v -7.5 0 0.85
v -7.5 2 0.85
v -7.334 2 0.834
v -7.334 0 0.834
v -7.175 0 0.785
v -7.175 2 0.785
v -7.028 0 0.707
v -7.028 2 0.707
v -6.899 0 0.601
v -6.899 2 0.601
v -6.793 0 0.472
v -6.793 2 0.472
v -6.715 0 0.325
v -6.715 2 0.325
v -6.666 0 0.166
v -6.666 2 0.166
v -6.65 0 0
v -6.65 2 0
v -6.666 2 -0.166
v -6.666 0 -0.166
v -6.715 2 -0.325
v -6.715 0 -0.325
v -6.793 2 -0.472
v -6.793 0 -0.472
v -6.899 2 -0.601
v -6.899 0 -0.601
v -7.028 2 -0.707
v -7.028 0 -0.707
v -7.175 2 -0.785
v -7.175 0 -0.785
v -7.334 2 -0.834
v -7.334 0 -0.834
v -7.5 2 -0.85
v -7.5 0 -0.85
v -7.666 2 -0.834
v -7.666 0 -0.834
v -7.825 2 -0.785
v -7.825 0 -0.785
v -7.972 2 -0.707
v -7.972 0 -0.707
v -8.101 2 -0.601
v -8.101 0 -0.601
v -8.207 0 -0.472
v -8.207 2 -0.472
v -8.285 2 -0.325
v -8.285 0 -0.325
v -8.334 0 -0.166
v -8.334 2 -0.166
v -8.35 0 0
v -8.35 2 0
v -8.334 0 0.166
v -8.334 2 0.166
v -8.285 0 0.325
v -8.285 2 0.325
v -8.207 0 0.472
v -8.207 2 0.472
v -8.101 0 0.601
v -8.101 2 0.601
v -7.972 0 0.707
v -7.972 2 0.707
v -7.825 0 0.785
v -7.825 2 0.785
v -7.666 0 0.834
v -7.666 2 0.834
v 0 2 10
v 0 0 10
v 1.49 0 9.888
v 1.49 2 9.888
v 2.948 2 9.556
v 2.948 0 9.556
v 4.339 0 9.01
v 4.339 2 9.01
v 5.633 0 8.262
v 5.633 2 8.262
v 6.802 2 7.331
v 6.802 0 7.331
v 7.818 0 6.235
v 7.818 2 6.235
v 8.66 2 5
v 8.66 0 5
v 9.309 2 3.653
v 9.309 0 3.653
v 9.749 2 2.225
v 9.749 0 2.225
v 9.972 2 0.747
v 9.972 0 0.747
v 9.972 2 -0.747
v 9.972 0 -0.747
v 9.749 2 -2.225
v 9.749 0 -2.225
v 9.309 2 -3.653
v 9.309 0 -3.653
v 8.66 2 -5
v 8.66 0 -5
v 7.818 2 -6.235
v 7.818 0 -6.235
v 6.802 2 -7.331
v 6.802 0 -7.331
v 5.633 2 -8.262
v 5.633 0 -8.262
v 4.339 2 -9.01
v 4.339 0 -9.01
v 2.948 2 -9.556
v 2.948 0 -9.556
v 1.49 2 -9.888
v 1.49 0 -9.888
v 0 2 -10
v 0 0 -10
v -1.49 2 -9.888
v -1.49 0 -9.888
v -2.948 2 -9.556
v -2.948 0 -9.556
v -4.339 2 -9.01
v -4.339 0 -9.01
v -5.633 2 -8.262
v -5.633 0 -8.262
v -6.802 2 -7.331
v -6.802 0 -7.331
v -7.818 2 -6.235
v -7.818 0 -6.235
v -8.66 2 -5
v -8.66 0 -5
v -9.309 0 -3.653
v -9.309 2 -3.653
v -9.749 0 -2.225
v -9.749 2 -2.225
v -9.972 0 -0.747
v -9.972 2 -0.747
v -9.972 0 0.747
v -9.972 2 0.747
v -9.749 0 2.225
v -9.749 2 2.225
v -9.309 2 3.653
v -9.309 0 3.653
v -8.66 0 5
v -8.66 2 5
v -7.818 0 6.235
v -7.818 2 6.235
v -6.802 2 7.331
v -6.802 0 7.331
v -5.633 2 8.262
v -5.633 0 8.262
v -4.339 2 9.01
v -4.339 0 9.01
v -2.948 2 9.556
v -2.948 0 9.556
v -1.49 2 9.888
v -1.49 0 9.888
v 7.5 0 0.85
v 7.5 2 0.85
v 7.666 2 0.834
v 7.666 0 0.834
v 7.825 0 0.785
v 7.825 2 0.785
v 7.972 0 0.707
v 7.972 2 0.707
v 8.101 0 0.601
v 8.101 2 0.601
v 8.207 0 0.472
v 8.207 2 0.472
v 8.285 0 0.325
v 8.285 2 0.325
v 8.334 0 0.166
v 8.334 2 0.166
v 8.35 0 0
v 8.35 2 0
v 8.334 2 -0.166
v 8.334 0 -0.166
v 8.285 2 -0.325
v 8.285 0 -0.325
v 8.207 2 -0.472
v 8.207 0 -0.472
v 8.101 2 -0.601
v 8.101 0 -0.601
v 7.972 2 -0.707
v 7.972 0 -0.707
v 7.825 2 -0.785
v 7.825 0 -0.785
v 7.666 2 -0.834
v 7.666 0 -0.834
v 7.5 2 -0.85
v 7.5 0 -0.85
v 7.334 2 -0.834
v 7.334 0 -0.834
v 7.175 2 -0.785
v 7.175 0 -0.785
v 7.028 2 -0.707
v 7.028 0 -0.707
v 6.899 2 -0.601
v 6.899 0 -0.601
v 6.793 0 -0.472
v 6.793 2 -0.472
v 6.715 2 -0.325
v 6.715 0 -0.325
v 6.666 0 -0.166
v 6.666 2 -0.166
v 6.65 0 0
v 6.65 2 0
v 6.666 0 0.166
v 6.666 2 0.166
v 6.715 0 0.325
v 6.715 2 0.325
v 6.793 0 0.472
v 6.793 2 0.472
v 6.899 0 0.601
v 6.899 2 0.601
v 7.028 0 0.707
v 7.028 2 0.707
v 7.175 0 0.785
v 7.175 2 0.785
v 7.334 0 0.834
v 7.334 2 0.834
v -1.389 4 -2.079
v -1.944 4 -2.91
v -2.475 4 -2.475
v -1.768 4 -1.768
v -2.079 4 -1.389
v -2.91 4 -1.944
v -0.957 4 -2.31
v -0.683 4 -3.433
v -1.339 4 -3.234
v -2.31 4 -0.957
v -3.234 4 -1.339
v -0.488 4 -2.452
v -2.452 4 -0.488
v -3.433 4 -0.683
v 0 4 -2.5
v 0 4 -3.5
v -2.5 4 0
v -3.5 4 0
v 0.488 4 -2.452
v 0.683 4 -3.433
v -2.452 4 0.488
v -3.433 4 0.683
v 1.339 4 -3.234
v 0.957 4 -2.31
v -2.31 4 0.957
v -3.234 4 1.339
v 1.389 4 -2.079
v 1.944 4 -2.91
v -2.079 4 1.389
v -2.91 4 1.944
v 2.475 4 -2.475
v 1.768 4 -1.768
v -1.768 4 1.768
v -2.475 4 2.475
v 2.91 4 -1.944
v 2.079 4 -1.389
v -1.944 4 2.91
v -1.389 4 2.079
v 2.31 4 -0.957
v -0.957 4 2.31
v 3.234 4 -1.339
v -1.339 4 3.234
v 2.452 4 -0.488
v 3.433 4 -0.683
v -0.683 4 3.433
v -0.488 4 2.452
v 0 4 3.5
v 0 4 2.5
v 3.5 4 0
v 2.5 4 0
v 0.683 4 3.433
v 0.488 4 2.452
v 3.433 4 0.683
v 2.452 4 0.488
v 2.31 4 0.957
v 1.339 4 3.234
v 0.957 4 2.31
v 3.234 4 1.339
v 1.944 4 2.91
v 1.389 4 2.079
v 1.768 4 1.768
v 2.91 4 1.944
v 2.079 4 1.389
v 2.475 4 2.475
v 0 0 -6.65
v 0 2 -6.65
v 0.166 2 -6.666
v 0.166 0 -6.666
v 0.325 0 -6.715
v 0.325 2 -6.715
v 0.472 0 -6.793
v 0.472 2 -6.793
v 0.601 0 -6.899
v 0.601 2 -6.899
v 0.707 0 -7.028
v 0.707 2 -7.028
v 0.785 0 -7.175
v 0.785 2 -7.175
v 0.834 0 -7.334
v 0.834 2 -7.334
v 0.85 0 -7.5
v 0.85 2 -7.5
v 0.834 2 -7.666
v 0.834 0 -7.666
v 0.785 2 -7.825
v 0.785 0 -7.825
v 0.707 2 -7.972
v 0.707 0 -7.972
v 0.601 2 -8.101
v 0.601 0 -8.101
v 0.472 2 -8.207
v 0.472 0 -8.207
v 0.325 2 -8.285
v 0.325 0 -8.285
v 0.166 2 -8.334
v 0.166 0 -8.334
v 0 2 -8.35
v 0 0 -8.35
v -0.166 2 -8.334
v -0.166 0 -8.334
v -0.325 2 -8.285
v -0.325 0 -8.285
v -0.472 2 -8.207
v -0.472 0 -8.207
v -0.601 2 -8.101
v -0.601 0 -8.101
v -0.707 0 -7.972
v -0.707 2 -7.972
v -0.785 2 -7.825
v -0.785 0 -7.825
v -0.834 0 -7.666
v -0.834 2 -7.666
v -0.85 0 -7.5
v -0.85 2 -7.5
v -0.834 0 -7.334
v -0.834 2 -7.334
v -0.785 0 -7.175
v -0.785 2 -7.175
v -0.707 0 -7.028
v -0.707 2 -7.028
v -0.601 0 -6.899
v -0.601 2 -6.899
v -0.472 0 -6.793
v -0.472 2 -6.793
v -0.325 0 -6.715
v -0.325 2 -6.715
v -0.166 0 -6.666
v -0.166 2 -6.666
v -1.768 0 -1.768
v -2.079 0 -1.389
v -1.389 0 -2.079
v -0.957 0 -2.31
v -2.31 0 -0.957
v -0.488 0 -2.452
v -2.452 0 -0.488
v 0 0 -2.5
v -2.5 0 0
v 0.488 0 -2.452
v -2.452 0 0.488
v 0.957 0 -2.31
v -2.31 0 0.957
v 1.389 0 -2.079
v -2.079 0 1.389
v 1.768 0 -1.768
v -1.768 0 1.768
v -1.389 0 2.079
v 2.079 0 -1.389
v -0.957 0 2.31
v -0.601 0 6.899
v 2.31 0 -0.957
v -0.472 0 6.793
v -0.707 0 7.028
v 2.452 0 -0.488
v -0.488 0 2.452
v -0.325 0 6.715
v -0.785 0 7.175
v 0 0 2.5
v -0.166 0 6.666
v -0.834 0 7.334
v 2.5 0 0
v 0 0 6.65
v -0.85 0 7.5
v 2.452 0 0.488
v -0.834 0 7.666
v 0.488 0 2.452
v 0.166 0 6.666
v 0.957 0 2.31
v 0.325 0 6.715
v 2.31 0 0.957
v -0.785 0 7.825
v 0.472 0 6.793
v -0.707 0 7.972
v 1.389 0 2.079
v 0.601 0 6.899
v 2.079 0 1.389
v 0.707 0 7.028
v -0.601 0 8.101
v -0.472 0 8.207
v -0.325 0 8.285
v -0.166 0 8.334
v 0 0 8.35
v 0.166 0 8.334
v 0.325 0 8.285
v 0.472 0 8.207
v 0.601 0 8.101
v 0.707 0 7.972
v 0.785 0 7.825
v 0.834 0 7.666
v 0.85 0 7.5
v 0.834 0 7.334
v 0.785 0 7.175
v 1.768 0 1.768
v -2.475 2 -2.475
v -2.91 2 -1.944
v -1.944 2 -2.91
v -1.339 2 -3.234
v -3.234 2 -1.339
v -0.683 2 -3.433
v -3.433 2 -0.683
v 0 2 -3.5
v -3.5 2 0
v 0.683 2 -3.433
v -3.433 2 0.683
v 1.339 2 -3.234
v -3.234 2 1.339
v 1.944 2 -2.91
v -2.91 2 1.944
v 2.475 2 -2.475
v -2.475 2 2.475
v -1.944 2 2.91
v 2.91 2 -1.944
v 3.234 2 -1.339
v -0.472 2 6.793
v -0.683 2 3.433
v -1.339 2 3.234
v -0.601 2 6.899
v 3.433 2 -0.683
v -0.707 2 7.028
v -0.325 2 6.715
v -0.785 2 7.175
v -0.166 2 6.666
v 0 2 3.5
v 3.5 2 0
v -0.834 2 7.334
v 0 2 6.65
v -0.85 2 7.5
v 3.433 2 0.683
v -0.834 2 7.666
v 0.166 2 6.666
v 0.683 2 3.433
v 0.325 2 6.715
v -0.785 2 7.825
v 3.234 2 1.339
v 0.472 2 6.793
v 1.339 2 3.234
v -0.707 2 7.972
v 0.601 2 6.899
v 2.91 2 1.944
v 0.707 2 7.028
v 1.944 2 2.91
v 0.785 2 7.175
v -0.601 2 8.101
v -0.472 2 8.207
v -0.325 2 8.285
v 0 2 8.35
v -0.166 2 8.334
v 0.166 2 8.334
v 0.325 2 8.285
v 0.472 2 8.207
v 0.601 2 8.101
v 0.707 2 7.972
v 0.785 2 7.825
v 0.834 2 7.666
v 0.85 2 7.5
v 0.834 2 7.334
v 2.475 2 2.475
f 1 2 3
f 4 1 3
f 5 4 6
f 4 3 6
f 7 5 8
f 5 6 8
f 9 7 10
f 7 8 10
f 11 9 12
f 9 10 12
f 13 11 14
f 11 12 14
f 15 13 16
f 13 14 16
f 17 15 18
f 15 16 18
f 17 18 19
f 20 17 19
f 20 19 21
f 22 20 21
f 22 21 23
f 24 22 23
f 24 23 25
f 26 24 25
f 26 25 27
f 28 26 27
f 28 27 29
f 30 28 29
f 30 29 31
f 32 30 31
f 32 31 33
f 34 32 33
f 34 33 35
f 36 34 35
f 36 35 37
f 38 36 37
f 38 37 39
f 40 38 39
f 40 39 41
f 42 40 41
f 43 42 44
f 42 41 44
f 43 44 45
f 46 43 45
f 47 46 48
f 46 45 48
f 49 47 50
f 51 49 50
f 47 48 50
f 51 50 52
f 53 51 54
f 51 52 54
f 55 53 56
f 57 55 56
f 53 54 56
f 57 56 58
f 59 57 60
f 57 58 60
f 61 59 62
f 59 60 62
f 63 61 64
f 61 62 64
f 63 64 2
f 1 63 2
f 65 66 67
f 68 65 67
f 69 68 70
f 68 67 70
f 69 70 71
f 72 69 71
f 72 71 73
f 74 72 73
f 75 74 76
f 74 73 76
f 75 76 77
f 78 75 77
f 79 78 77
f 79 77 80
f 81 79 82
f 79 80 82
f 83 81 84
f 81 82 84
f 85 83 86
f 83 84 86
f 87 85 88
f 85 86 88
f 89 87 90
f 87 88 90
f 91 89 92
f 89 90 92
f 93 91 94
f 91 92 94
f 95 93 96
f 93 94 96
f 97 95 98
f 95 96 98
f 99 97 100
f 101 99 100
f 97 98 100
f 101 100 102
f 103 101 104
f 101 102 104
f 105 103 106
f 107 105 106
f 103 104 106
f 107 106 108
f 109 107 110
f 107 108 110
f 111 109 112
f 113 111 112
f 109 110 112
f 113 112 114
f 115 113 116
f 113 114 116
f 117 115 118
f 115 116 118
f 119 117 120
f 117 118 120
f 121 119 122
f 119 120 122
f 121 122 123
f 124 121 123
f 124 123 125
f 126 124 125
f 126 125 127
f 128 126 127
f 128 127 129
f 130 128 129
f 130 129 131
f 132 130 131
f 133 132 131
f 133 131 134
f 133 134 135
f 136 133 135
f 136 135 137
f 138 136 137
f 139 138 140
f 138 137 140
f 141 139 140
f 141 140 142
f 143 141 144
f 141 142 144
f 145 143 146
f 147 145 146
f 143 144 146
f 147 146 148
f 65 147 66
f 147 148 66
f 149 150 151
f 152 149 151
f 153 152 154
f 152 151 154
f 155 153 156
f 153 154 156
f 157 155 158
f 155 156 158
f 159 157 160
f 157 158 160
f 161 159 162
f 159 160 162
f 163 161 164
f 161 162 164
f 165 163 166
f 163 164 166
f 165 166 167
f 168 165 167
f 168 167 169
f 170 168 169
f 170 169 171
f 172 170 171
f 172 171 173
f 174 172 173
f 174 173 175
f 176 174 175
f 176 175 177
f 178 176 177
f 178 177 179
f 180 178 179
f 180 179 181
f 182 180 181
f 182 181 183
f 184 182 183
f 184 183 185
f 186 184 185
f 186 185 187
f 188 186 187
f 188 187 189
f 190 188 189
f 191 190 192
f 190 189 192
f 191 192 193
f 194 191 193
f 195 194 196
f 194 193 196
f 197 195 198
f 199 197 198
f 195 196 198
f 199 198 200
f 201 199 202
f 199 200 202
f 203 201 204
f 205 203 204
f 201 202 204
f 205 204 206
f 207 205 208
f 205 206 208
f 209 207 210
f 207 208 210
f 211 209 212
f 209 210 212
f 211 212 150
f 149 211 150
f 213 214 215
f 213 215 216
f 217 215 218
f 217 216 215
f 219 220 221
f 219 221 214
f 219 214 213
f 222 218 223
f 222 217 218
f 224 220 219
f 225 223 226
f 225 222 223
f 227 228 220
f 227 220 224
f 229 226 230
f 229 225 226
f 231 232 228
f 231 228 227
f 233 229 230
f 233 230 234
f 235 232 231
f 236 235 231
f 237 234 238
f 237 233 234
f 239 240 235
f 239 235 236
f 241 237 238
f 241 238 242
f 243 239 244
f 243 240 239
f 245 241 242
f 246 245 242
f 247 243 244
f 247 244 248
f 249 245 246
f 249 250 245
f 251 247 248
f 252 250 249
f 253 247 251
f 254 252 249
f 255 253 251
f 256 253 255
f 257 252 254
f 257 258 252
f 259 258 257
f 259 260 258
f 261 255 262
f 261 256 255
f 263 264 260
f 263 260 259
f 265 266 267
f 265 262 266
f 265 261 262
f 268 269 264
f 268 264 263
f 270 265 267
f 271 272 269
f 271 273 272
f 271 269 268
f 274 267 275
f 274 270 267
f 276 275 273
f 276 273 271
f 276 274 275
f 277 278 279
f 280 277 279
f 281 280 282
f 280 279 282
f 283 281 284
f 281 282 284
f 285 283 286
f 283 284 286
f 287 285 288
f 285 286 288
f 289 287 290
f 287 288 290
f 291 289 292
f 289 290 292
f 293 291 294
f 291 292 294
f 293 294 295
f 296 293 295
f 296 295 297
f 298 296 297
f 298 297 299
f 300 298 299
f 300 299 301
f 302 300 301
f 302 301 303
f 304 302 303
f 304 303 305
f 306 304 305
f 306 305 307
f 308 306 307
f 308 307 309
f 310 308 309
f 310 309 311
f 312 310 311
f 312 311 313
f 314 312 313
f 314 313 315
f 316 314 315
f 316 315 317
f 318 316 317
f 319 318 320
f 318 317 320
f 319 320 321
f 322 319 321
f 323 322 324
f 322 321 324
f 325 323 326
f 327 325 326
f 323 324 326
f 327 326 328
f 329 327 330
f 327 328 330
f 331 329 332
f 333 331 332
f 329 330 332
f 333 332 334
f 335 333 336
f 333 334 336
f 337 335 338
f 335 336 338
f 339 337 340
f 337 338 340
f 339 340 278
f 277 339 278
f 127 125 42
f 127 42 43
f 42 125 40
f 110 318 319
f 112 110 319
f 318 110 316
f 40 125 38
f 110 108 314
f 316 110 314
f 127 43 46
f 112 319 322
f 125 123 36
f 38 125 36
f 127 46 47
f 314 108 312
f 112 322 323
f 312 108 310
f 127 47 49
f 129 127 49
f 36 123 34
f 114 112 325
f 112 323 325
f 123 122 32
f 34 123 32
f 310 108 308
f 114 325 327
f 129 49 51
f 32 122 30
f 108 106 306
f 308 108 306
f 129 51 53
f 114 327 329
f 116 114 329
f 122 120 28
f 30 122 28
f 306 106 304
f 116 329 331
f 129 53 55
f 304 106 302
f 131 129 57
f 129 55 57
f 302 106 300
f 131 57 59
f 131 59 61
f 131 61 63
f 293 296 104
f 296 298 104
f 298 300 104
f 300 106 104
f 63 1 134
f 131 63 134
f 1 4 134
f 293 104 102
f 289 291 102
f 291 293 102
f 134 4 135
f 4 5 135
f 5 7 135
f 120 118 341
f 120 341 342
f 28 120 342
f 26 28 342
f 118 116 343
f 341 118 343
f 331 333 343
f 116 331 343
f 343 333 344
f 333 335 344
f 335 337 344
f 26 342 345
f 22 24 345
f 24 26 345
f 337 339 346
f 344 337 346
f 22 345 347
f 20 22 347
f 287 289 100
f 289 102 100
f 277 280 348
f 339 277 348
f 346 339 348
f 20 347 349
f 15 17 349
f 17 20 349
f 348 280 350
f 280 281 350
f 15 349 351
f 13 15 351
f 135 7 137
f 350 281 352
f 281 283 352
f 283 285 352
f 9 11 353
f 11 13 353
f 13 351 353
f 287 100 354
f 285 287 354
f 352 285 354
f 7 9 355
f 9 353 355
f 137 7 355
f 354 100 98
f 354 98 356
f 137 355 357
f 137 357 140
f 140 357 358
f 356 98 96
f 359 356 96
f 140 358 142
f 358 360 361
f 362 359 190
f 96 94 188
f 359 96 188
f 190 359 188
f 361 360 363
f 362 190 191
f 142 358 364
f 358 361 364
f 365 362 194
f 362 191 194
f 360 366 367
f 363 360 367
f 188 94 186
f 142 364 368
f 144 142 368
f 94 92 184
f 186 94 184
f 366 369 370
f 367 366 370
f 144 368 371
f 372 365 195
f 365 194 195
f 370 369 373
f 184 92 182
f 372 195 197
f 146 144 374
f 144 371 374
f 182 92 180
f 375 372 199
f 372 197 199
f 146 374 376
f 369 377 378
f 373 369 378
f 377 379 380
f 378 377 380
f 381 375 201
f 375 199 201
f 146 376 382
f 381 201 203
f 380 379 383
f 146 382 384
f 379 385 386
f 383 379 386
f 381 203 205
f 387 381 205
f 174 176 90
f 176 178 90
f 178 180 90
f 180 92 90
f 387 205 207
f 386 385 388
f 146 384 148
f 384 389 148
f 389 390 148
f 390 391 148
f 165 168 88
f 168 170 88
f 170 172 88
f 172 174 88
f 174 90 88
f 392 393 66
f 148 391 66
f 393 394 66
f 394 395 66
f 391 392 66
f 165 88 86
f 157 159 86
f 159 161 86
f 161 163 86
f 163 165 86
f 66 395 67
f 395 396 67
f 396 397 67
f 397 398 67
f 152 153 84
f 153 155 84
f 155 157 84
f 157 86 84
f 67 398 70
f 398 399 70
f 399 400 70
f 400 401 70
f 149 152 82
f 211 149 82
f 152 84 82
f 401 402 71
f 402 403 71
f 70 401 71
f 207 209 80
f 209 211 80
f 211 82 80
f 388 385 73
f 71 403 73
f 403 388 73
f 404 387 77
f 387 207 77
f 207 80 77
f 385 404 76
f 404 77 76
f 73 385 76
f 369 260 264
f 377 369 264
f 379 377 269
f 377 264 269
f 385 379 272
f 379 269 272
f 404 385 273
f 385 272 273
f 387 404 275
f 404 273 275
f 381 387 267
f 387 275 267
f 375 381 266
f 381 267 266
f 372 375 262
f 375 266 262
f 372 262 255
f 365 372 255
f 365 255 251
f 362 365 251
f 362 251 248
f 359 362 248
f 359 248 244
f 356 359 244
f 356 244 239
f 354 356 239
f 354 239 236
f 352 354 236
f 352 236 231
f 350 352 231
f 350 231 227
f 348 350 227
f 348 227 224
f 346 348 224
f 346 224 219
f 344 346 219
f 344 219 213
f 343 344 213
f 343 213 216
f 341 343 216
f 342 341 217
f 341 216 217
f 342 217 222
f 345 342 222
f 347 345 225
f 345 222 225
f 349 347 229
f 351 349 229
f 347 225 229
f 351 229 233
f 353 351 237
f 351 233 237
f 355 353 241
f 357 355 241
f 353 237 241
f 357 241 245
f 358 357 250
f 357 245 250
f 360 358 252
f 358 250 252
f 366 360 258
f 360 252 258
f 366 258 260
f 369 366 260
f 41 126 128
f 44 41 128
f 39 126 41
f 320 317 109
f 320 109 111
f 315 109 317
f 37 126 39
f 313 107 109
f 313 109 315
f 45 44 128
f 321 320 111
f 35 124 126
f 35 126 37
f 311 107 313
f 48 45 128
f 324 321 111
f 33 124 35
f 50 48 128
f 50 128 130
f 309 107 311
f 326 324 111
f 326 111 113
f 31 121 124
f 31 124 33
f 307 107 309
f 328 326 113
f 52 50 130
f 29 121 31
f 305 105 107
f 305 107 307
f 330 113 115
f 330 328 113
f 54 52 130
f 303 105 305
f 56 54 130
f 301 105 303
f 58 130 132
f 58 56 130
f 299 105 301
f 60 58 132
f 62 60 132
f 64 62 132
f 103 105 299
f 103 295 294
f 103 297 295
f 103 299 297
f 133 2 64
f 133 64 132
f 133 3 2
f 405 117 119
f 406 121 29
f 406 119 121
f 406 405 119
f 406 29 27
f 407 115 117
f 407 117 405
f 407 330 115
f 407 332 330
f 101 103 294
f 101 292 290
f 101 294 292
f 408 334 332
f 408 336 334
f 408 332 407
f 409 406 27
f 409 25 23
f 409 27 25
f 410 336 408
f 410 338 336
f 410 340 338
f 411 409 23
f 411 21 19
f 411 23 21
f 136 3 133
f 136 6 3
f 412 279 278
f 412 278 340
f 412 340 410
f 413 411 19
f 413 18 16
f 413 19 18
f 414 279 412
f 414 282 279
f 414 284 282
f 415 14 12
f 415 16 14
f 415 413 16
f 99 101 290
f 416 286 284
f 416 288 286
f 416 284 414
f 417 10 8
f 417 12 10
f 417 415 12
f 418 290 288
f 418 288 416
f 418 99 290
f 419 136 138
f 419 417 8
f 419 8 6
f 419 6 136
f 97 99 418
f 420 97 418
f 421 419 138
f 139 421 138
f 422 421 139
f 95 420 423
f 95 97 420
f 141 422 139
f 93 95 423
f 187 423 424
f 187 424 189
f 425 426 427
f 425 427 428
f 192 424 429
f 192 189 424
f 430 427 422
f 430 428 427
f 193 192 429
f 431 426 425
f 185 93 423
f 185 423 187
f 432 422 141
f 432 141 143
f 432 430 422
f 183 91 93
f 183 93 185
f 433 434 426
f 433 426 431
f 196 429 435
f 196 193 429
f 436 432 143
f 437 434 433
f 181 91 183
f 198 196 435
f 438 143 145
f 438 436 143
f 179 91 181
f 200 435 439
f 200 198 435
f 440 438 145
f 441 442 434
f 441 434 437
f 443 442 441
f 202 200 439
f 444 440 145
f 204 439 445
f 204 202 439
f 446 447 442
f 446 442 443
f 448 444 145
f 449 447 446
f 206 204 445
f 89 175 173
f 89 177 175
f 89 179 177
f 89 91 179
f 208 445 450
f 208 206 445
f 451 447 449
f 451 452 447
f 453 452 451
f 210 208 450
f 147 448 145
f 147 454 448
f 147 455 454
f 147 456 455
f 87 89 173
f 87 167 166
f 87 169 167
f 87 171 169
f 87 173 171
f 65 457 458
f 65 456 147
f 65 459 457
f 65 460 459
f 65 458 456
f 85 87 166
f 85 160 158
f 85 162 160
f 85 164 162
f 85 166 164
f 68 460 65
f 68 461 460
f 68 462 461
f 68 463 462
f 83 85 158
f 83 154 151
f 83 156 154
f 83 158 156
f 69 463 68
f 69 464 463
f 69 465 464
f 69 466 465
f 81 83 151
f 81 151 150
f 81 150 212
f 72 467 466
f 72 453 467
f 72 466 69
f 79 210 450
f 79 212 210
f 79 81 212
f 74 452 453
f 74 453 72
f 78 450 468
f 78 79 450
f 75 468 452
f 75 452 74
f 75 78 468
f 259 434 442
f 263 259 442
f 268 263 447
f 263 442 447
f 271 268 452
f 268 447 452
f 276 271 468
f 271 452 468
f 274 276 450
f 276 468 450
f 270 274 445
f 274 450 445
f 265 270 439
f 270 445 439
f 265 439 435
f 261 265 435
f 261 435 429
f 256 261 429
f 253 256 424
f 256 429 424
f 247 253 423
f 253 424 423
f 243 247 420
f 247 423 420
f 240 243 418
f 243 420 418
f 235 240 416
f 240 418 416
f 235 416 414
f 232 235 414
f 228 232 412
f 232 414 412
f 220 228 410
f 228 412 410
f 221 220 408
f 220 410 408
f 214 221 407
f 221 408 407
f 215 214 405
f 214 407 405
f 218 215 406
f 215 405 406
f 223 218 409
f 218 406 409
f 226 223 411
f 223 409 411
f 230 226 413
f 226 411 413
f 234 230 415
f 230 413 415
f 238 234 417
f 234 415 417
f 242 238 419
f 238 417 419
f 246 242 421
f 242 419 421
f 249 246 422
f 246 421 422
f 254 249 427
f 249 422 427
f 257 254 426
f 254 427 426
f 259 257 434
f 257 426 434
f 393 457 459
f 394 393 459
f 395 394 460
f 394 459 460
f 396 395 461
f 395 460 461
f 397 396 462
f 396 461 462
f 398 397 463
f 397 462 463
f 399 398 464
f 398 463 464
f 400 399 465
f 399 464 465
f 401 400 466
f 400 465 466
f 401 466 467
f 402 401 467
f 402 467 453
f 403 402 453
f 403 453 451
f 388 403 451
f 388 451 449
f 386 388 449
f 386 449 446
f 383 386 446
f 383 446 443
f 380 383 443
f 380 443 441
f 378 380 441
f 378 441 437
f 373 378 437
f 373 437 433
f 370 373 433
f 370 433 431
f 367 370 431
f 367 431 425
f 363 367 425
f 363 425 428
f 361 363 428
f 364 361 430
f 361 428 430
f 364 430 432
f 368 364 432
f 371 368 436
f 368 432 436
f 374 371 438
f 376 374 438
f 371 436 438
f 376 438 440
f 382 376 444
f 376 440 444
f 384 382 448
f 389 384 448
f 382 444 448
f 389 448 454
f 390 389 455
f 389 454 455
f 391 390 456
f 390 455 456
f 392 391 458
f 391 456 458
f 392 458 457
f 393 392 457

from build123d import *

# Parameters (mm, degrees)
SKETCH1_R           = 10
BOSS_EXTRUDE1_DEPTH = 2
SKETCH2_R           = 3.5
BOSS_EXTRUDE2_DEPTH = 2
SKETCH3_R           = 2.5
CUT_EXTRUDE1_DEPTH  = 15.696938457
SKETCH4_R           = 0.85
CUT_EXTRUDE2_DEPTH  = 15.282856857


with BuildPart() as part:
    # Sketch1 → Boss-Extrude1 (new body)
    with BuildSketch(Plane(origin=(0, 0, 0), x_dir=(1, 0, 0), z_dir=(0, 1, 0))):
        with Locations(Location((0, 0, 0), (0, 0, 270))):
            Circle(SKETCH1_R)
    extrude(amount=BOSS_EXTRUDE1_DEPTH)

    # Sketch2 → Boss-Extrude2 (add)
    with BuildSketch(Plane(origin=(0, 2, 0), x_dir=(1, 0, 0), z_dir=(0, 1, 0))):
        with Locations(Location((0, 0, 0), (0, 0, 270))):
            Circle(SKETCH2_R)
    extrude(amount=BOSS_EXTRUDE2_DEPTH)

    # Sketch3 → Cut-Extrude1 (cut, through all)
    with BuildSketch(Plane(origin=(0, 4, 0), x_dir=(1, 0, 0), z_dir=(0, 1, 0))):
        with Locations(Location((0, 0, 0), (0, 0, 270))):
            Circle(SKETCH3_R)
    extrude(amount=-CUT_EXTRUDE1_DEPTH, mode=Mode.SUBTRACT)

    # Sketch4 → Cut-Extrude2 (cut, through all)
    with BuildSketch(Plane(origin=(0, 2, 0), x_dir=(1, 0, 0), z_dir=(0, 1, 0))):
        with Locations(Location((0, 7.5, 0), (0, 0, 270))):
            Circle(SKETCH4_R)
        with Locations(Location((-7.5, 0, 0), (0, 0, 270))):
            Circle(SKETCH4_R)
        with Locations(Location((7.5, 0, 0), (0, 0, 270))):
            Circle(SKETCH4_R)
        with Locations(Location((0, -7.5, 0), (0, 0, 270))):
            Circle(SKETCH4_R)
    extrude(amount=-CUT_EXTRUDE2_DEPTH, mode=Mode.SUBTRACT)


solid = part.part
